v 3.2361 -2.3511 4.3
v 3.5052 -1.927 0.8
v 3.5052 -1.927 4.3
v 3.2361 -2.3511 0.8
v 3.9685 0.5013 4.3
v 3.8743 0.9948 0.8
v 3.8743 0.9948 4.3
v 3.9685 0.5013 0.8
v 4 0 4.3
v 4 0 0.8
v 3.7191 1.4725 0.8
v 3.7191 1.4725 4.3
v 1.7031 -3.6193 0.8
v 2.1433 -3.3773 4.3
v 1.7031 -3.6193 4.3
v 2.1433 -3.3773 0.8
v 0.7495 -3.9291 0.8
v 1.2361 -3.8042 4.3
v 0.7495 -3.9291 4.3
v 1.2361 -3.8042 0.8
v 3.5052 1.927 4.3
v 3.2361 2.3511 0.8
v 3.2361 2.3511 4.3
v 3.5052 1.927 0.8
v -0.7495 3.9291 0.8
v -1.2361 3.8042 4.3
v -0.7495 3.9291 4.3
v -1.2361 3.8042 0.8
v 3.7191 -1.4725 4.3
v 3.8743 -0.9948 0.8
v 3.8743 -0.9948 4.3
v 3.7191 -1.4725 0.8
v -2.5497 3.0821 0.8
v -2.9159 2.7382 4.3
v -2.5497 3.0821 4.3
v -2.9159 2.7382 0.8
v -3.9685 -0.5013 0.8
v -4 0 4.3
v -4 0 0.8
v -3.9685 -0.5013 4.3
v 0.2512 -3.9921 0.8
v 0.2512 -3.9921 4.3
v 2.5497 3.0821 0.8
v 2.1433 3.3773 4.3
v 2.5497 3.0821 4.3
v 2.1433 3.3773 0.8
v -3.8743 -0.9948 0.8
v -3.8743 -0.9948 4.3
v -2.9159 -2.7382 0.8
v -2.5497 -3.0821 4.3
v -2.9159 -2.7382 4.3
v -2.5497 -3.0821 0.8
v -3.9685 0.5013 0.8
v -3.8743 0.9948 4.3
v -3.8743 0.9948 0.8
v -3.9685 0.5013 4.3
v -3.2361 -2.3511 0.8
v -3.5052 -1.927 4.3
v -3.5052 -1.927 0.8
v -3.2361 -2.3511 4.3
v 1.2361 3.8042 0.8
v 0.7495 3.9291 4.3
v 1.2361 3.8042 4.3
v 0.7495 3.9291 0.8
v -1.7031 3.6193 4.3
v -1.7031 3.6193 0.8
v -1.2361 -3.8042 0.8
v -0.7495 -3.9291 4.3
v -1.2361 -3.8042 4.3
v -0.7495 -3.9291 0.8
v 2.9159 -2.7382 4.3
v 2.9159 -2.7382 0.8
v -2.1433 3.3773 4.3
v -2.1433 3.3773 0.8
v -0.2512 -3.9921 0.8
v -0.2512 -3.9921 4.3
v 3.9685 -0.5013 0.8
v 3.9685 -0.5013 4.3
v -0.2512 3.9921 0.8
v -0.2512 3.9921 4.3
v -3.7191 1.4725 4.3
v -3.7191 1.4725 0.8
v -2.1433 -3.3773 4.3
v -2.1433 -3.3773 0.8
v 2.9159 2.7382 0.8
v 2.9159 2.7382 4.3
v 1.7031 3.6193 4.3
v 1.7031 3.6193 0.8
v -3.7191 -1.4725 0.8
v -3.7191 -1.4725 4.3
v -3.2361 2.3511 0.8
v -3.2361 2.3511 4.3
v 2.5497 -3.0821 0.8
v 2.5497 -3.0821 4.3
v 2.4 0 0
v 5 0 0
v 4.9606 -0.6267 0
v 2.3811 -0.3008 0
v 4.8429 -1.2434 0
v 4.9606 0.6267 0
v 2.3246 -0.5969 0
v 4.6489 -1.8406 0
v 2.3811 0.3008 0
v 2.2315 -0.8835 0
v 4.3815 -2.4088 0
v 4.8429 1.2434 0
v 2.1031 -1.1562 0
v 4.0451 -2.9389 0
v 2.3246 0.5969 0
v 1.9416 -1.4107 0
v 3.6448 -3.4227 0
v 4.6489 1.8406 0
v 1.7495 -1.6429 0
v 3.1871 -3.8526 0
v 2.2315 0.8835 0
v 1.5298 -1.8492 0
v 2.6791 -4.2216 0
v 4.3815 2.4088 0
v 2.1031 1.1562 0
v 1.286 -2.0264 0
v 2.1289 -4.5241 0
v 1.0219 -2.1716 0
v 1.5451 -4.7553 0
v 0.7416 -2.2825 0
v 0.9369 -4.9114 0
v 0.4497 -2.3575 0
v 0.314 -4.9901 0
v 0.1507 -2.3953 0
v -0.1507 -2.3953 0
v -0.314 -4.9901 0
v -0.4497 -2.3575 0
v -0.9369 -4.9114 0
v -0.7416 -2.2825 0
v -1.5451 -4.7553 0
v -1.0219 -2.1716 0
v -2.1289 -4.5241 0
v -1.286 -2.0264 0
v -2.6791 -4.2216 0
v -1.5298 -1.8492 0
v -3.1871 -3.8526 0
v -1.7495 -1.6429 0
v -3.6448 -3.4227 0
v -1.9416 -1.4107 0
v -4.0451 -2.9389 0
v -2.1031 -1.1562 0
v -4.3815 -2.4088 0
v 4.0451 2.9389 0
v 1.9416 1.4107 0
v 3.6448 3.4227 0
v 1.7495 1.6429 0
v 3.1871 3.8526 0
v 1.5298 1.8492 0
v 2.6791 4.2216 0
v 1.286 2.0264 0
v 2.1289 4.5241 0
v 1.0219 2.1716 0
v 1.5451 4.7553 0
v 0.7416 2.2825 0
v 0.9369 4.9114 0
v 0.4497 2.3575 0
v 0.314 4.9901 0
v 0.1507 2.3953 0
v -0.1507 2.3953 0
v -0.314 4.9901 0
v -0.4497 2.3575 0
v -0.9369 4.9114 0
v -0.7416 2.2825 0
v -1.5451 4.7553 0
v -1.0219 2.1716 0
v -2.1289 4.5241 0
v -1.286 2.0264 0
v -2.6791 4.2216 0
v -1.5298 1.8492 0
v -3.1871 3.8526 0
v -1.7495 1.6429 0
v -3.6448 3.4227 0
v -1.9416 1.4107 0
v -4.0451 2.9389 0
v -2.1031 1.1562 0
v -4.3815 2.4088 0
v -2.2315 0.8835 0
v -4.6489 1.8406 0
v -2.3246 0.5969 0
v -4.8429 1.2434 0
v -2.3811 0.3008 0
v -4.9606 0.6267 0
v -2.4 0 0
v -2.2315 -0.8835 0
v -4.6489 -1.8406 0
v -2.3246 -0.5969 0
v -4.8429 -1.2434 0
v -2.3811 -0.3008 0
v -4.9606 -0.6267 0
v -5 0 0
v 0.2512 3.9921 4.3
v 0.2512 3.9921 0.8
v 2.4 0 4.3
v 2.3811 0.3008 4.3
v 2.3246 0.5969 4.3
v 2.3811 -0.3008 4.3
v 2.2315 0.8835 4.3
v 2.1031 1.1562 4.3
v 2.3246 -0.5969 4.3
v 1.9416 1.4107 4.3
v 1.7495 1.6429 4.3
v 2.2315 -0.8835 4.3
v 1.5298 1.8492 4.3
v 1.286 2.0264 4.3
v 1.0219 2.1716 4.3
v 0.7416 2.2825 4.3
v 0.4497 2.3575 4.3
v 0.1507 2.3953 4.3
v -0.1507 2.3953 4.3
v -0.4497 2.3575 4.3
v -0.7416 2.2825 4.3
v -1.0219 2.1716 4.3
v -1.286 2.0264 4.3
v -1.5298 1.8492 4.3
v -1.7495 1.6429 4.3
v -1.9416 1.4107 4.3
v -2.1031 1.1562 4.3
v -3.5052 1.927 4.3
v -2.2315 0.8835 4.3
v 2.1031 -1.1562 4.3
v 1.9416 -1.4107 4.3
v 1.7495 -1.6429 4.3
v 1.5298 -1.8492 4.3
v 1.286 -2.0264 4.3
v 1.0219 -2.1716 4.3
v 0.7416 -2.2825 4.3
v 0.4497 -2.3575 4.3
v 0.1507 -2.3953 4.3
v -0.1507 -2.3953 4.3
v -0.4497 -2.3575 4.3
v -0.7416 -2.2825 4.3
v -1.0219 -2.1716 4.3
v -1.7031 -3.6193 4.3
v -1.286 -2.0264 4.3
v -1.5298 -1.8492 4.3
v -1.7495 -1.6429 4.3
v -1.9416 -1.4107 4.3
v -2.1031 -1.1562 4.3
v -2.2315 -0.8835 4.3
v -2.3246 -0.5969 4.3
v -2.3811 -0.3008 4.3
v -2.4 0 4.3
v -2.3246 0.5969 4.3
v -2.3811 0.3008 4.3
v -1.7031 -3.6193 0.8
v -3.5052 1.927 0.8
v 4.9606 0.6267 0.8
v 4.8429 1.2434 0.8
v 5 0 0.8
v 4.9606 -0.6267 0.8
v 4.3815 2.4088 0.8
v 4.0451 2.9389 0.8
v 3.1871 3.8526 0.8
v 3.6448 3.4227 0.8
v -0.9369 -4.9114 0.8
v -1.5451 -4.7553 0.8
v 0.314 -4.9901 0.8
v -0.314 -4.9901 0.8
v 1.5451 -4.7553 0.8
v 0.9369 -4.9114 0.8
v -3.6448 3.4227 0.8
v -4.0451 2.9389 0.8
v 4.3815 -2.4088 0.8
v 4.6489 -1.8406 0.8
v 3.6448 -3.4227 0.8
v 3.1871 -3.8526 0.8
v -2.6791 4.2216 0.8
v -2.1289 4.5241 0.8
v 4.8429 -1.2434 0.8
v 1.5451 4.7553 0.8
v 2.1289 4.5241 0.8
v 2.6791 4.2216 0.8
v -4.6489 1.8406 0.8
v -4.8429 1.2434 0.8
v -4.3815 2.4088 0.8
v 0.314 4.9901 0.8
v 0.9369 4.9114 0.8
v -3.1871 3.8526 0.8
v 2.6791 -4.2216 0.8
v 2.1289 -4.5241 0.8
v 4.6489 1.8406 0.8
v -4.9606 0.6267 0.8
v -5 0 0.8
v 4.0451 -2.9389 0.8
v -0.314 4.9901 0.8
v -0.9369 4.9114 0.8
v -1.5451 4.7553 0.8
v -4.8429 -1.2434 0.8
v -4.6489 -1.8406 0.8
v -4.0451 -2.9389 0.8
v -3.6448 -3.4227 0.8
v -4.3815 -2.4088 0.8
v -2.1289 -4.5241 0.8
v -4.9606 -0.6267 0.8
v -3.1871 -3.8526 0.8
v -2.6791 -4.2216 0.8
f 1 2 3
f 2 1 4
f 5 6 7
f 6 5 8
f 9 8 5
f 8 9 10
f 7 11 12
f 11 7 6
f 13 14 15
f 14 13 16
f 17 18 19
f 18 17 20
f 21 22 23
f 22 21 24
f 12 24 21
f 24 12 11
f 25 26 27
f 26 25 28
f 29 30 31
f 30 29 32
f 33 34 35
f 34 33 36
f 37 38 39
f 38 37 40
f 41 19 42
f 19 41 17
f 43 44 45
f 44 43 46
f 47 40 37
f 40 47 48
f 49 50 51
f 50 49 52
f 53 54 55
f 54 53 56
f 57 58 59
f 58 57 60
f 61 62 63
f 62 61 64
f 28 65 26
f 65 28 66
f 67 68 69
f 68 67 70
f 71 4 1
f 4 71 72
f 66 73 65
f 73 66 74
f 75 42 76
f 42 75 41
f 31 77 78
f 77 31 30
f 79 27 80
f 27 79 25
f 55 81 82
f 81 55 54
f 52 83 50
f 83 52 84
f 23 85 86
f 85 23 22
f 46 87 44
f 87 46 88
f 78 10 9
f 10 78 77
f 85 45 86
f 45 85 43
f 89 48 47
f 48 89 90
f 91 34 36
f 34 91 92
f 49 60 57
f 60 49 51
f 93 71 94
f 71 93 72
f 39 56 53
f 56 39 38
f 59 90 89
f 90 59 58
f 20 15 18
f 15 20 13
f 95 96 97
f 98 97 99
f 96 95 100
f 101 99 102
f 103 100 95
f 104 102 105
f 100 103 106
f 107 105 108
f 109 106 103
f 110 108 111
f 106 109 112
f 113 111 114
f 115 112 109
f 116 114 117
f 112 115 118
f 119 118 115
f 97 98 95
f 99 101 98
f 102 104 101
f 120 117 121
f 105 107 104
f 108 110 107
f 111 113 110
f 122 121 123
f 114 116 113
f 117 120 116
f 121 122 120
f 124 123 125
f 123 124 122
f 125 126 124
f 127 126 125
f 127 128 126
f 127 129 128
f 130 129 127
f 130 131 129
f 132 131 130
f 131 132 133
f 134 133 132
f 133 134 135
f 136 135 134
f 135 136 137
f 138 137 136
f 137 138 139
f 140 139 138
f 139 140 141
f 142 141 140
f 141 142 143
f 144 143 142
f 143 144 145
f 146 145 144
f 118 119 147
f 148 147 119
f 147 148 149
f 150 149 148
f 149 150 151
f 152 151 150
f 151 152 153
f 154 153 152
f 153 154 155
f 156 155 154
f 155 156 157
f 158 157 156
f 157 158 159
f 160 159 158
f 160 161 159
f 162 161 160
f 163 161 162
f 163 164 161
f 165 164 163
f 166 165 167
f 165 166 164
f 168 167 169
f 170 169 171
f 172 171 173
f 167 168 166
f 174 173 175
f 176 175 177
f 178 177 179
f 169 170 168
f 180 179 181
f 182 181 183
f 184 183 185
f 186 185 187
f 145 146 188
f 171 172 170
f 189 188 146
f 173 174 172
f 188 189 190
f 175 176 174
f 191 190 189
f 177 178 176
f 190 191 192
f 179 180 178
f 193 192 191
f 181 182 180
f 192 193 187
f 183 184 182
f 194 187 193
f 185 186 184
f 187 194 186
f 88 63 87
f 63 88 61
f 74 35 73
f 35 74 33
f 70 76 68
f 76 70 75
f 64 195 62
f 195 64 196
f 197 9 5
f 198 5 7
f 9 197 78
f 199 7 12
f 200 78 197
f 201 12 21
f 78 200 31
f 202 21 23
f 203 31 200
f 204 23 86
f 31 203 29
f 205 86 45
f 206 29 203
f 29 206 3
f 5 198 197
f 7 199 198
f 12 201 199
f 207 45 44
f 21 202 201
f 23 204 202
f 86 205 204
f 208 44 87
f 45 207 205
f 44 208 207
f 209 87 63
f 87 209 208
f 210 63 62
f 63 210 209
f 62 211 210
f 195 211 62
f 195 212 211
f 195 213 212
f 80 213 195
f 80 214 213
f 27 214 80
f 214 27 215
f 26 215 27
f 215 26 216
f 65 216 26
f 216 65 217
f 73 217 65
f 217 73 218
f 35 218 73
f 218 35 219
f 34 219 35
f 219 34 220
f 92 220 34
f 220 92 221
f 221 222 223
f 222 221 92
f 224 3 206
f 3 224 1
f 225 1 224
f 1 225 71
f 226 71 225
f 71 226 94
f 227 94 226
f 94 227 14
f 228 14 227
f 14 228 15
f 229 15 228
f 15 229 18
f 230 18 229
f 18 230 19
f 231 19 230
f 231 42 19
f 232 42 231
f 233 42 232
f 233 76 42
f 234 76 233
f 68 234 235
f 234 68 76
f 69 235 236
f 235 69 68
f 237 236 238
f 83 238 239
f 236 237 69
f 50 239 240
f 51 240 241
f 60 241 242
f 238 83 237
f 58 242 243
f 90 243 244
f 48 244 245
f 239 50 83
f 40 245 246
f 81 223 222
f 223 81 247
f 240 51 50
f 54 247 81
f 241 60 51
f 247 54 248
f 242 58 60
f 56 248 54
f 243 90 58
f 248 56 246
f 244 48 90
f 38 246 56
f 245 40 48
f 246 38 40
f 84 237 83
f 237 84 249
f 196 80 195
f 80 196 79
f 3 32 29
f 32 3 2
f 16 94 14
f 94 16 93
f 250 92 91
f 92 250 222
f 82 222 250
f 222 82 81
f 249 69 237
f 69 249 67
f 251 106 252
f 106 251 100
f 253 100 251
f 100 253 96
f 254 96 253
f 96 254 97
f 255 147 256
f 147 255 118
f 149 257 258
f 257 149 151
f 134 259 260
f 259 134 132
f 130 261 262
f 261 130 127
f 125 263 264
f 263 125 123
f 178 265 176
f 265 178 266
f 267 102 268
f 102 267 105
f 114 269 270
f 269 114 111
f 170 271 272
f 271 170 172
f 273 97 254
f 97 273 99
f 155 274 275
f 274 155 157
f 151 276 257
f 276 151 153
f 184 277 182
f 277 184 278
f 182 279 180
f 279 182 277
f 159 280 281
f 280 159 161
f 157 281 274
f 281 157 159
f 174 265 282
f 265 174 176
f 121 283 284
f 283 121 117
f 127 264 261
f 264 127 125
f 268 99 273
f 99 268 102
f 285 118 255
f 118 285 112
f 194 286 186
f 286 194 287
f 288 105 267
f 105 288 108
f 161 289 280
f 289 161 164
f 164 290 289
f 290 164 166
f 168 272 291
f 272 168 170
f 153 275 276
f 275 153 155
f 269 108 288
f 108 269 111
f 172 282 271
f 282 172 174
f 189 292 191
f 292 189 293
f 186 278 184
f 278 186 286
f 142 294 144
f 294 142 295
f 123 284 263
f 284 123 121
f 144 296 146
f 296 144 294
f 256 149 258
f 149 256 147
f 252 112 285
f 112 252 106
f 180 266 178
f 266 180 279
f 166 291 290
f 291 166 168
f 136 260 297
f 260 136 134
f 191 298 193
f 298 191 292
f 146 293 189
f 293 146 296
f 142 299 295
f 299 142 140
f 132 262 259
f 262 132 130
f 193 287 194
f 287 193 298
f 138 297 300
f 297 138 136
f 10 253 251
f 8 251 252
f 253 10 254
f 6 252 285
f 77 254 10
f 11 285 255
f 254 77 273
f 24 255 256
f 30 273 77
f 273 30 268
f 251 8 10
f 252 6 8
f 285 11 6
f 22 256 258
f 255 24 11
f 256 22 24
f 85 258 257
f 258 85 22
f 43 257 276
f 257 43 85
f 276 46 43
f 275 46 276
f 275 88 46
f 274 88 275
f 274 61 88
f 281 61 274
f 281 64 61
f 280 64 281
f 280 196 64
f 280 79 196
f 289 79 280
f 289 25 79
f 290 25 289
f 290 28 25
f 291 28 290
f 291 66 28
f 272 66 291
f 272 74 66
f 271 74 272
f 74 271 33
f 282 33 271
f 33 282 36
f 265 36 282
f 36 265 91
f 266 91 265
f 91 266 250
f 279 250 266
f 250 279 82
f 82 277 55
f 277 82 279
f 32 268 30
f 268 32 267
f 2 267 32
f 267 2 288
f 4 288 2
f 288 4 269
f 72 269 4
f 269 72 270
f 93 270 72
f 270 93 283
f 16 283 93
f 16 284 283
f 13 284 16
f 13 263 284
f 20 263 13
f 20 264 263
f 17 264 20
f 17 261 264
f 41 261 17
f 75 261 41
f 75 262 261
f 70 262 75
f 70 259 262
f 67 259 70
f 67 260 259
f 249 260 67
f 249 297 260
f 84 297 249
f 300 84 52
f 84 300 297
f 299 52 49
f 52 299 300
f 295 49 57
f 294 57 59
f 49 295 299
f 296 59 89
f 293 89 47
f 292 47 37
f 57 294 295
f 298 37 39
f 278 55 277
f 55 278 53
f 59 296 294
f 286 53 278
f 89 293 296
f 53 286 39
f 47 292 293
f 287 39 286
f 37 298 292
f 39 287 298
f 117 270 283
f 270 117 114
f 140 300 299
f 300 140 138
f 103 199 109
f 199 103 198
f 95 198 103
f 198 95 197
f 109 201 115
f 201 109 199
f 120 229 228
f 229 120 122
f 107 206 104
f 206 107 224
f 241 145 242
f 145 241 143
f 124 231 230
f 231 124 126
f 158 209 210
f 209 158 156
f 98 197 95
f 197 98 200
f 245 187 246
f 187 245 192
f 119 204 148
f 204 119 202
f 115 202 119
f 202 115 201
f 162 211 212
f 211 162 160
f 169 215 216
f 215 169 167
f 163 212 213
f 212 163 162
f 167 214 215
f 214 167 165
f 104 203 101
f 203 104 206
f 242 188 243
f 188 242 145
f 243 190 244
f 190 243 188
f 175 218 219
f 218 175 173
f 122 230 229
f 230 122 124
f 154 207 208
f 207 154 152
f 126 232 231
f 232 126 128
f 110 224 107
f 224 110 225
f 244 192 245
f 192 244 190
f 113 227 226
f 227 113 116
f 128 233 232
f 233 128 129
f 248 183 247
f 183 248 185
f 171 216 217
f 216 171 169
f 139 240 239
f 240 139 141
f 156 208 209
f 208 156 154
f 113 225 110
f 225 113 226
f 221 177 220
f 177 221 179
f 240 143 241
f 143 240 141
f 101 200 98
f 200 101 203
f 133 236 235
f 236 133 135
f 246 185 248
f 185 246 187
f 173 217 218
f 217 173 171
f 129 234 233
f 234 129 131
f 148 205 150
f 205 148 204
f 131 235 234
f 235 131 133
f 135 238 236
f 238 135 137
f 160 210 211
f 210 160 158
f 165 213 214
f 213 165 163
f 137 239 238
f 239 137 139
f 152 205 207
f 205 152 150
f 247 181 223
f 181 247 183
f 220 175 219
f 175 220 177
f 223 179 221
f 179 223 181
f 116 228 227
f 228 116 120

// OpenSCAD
h=8.6;

difference() {
  union() {
    cylinder(r=4,h=h/2, $fn=50);
    cylinder(r=5,h=(h-7)/2, $fn=50);
  }
  cylinder(r=2.4,h, $fn=50);
}
